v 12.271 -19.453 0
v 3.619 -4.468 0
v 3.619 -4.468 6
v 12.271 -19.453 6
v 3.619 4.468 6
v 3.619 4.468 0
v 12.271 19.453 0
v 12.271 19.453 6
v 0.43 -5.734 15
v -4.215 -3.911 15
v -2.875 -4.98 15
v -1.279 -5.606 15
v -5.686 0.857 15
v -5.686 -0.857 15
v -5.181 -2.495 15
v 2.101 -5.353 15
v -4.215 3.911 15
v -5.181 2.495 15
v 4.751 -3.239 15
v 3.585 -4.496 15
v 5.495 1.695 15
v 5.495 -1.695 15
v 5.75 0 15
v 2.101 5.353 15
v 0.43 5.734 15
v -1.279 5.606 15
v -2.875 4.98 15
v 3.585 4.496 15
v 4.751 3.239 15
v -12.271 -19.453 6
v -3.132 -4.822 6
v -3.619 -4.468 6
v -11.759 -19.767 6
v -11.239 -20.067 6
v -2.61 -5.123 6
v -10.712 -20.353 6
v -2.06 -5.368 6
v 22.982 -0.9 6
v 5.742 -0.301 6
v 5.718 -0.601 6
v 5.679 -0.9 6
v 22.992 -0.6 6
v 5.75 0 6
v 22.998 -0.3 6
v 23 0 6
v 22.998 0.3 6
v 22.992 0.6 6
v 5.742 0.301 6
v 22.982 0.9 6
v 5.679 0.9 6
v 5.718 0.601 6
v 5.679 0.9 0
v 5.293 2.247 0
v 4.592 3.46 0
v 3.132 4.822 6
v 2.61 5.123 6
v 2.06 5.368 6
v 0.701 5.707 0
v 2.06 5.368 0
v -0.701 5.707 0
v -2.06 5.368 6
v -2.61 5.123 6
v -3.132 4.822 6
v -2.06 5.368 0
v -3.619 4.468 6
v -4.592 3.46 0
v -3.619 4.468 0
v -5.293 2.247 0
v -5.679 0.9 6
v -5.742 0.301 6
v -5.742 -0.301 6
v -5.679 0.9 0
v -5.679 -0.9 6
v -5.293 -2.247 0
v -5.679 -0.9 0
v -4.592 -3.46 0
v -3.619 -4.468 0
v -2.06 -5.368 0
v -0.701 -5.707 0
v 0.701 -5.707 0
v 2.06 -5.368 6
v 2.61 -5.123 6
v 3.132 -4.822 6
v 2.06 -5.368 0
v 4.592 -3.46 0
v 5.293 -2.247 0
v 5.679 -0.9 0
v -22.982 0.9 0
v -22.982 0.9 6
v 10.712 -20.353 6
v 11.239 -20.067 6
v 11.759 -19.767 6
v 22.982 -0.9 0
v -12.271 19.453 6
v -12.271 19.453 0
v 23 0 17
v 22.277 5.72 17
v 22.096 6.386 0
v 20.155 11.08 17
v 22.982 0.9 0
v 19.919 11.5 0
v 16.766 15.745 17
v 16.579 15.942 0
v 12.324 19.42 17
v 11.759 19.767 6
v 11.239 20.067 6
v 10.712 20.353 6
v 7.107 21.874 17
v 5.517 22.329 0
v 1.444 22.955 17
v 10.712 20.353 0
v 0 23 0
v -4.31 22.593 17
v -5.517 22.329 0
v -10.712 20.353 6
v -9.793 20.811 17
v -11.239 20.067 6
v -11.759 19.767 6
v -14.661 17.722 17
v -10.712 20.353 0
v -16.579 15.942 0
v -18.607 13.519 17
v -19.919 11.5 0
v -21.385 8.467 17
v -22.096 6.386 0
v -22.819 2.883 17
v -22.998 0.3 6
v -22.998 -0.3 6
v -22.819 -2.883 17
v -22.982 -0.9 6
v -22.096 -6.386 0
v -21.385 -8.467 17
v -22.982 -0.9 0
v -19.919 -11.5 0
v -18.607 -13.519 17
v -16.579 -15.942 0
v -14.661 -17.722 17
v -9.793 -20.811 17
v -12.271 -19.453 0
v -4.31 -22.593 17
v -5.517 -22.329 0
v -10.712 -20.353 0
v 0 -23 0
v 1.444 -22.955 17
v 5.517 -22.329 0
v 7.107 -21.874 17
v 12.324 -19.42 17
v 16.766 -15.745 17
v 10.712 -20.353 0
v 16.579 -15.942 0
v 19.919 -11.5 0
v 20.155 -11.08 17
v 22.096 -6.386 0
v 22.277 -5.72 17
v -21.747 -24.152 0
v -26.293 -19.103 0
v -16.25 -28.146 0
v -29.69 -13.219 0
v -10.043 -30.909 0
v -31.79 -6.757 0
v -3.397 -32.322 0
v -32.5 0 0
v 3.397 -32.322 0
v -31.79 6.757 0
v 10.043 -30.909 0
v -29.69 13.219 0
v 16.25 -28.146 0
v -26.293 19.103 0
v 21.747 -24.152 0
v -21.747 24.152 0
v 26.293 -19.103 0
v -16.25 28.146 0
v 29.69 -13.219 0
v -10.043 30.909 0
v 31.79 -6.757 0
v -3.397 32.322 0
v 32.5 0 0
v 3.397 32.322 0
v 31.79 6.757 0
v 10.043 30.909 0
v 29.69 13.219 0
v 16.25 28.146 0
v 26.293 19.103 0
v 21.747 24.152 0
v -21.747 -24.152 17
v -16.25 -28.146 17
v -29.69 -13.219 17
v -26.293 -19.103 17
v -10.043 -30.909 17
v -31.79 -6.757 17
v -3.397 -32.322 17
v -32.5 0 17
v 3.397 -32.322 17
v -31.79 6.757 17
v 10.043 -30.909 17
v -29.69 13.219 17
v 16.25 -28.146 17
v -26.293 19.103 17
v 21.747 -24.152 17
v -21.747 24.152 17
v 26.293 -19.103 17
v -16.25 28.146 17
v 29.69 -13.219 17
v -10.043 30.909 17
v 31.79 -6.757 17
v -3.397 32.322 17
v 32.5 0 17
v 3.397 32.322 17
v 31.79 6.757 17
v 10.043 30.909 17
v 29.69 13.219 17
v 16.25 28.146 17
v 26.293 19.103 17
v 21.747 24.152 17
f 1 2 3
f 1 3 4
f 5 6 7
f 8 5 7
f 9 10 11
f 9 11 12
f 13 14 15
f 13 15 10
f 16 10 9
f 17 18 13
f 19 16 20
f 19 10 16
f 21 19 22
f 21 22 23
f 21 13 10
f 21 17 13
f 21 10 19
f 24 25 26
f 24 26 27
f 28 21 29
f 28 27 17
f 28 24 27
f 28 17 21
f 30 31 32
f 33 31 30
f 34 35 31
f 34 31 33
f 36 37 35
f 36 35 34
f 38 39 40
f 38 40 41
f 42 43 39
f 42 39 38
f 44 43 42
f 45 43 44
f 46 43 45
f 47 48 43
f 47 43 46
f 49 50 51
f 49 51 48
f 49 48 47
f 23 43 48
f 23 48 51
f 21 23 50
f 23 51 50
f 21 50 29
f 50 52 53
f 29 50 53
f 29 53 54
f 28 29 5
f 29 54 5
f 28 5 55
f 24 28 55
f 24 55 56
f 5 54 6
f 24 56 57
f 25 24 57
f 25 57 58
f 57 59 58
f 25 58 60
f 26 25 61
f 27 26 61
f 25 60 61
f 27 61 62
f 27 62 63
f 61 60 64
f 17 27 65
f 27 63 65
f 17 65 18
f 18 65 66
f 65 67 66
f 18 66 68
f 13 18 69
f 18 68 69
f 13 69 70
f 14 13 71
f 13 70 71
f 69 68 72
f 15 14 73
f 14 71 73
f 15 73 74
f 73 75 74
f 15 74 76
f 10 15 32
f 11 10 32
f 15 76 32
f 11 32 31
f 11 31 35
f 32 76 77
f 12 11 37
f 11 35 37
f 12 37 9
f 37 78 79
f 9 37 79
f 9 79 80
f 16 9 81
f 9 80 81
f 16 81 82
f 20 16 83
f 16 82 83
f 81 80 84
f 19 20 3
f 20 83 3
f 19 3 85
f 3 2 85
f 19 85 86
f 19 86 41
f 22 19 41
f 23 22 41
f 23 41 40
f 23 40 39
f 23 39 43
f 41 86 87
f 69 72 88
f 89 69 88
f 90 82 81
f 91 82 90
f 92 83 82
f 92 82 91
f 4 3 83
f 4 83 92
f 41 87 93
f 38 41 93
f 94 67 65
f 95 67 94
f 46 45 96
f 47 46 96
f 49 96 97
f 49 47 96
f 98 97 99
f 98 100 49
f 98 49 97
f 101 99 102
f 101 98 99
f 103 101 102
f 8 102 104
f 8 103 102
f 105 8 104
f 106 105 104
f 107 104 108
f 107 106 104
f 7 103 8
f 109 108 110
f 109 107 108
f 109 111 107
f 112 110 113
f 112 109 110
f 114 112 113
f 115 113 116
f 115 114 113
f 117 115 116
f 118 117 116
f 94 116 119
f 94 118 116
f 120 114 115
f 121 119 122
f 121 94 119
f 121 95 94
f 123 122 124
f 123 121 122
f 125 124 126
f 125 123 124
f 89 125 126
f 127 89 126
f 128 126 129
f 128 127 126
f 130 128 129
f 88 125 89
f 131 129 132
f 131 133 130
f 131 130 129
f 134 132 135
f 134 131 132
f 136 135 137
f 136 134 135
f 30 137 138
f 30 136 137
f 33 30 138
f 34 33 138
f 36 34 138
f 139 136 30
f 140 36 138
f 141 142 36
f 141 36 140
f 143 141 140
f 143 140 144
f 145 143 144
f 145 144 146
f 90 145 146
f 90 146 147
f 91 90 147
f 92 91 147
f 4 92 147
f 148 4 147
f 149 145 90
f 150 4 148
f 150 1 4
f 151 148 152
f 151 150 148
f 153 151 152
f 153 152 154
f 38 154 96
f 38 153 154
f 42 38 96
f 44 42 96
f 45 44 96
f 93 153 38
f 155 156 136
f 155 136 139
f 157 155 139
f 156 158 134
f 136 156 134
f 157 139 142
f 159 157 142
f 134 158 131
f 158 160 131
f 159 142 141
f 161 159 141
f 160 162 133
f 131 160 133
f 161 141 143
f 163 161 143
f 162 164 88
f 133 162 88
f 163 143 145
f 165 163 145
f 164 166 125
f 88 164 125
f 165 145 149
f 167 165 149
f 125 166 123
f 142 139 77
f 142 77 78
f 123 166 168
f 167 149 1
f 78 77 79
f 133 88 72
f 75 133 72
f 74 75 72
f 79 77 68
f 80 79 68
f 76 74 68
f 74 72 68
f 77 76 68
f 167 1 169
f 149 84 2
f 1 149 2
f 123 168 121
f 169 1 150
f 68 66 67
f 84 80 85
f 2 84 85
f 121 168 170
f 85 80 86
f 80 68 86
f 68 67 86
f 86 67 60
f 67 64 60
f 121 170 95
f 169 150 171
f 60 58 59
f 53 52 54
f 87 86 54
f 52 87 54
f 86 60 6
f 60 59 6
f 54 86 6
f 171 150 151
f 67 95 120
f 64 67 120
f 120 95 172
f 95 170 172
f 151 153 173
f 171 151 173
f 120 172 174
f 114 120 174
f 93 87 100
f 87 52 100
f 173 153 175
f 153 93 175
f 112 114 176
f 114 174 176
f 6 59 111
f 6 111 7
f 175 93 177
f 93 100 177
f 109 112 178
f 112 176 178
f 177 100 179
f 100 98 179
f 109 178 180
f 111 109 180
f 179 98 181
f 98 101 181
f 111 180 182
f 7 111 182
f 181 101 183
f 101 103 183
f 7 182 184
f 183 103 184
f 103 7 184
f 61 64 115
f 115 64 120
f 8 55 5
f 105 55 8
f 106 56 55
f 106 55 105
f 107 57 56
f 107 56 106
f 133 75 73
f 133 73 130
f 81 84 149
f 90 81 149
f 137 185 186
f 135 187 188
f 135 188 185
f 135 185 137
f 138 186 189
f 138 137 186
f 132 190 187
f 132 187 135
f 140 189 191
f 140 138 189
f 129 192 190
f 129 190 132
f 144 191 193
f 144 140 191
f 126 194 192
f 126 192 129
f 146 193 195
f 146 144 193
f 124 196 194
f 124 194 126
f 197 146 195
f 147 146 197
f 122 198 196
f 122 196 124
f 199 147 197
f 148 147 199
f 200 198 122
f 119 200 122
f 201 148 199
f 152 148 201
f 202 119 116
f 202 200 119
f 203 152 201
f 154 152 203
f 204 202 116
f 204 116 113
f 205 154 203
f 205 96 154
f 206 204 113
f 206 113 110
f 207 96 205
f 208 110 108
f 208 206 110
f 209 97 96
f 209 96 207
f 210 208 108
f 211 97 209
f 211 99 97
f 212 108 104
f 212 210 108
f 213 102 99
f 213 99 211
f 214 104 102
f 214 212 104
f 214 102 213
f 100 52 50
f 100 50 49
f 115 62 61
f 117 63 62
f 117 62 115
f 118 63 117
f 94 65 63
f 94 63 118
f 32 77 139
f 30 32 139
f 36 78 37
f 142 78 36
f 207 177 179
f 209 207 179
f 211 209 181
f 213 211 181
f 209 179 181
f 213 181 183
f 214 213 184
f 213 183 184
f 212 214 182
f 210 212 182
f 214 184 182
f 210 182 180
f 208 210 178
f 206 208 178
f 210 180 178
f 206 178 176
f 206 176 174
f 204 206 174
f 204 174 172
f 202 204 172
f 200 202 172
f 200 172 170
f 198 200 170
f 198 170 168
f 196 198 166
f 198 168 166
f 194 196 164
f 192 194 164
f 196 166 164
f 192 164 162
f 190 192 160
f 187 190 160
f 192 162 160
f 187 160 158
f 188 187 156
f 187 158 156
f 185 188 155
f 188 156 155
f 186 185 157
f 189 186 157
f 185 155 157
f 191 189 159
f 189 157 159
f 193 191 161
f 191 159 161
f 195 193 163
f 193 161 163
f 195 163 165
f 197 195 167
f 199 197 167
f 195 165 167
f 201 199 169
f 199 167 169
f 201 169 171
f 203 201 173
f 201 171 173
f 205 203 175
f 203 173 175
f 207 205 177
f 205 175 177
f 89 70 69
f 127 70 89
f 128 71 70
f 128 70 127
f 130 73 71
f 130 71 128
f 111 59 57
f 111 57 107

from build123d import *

# Parameters (mm, degrees)
BOX_W             = 19
BOX_H             = 1.8
BOX_DEPTH         = 6
ARRAY004_COUNT    = 6
CYLINDER_R        = 5.75
CYLINDER_DEPTH    = 15
CYLINDER003_R     = 23
CYLINDER003_DEPTH = 17
CYLINDER002_R     = 32.5
CYLINDER002_DEPTH = 17


with BuildPart() as array004:
    # Box → Box (new body)
    with BuildSketch(Plane(origin=(5, -0.9, 0), x_dir=(1, 0, 0), z_dir=(0, 0, 1))):
        with Locations((9.5, 0.9)):
            Rectangle(BOX_W, BOX_H)
    extrude(amount=BOX_DEPTH)

    # Array004: Array004 ×6 about axis
    array004_axis = Axis((0, 0, 0), (0, 0, 1))


with BuildPart() as array004_1:
    add(array004.part)
    for i in range(1, ARRAY004_COUNT):
        add(array004.part.rotate(array004_axis, i * 360 / ARRAY004_COUNT))


with BuildPart() as wheel_model:
    # Cylinder → Cylinder (new body)
    with BuildSketch(Plane.XY):
        Circle(CYLINDER_R)
    extrude(amount=CYLINDER_DEPTH)

    # Fusion: union Array004
    add(array004_1.part)


with BuildPart() as cilindro003:
    # Cylinder003 → Cylinder003 (new body)
    with BuildSketch(Plane.XY):
        Circle(CYLINDER003_R)
    extrude(amount=CYLINDER003_DEPTH)


with BuildPart() as wheel_model001:
    # Cylinder002 → Cylinder002 (new body)
    with BuildSketch(Plane.XY):
        Circle(CYLINDER002_R)
    extrude(amount=CYLINDER002_DEPTH)

    # Cut003: cut Cilindro003
    add(cilindro003.part, mode=Mode.SUBTRACT)

    # Fusion002: union Wheel_model
    add(wheel_model.part)


solid = wheel_model001.part
